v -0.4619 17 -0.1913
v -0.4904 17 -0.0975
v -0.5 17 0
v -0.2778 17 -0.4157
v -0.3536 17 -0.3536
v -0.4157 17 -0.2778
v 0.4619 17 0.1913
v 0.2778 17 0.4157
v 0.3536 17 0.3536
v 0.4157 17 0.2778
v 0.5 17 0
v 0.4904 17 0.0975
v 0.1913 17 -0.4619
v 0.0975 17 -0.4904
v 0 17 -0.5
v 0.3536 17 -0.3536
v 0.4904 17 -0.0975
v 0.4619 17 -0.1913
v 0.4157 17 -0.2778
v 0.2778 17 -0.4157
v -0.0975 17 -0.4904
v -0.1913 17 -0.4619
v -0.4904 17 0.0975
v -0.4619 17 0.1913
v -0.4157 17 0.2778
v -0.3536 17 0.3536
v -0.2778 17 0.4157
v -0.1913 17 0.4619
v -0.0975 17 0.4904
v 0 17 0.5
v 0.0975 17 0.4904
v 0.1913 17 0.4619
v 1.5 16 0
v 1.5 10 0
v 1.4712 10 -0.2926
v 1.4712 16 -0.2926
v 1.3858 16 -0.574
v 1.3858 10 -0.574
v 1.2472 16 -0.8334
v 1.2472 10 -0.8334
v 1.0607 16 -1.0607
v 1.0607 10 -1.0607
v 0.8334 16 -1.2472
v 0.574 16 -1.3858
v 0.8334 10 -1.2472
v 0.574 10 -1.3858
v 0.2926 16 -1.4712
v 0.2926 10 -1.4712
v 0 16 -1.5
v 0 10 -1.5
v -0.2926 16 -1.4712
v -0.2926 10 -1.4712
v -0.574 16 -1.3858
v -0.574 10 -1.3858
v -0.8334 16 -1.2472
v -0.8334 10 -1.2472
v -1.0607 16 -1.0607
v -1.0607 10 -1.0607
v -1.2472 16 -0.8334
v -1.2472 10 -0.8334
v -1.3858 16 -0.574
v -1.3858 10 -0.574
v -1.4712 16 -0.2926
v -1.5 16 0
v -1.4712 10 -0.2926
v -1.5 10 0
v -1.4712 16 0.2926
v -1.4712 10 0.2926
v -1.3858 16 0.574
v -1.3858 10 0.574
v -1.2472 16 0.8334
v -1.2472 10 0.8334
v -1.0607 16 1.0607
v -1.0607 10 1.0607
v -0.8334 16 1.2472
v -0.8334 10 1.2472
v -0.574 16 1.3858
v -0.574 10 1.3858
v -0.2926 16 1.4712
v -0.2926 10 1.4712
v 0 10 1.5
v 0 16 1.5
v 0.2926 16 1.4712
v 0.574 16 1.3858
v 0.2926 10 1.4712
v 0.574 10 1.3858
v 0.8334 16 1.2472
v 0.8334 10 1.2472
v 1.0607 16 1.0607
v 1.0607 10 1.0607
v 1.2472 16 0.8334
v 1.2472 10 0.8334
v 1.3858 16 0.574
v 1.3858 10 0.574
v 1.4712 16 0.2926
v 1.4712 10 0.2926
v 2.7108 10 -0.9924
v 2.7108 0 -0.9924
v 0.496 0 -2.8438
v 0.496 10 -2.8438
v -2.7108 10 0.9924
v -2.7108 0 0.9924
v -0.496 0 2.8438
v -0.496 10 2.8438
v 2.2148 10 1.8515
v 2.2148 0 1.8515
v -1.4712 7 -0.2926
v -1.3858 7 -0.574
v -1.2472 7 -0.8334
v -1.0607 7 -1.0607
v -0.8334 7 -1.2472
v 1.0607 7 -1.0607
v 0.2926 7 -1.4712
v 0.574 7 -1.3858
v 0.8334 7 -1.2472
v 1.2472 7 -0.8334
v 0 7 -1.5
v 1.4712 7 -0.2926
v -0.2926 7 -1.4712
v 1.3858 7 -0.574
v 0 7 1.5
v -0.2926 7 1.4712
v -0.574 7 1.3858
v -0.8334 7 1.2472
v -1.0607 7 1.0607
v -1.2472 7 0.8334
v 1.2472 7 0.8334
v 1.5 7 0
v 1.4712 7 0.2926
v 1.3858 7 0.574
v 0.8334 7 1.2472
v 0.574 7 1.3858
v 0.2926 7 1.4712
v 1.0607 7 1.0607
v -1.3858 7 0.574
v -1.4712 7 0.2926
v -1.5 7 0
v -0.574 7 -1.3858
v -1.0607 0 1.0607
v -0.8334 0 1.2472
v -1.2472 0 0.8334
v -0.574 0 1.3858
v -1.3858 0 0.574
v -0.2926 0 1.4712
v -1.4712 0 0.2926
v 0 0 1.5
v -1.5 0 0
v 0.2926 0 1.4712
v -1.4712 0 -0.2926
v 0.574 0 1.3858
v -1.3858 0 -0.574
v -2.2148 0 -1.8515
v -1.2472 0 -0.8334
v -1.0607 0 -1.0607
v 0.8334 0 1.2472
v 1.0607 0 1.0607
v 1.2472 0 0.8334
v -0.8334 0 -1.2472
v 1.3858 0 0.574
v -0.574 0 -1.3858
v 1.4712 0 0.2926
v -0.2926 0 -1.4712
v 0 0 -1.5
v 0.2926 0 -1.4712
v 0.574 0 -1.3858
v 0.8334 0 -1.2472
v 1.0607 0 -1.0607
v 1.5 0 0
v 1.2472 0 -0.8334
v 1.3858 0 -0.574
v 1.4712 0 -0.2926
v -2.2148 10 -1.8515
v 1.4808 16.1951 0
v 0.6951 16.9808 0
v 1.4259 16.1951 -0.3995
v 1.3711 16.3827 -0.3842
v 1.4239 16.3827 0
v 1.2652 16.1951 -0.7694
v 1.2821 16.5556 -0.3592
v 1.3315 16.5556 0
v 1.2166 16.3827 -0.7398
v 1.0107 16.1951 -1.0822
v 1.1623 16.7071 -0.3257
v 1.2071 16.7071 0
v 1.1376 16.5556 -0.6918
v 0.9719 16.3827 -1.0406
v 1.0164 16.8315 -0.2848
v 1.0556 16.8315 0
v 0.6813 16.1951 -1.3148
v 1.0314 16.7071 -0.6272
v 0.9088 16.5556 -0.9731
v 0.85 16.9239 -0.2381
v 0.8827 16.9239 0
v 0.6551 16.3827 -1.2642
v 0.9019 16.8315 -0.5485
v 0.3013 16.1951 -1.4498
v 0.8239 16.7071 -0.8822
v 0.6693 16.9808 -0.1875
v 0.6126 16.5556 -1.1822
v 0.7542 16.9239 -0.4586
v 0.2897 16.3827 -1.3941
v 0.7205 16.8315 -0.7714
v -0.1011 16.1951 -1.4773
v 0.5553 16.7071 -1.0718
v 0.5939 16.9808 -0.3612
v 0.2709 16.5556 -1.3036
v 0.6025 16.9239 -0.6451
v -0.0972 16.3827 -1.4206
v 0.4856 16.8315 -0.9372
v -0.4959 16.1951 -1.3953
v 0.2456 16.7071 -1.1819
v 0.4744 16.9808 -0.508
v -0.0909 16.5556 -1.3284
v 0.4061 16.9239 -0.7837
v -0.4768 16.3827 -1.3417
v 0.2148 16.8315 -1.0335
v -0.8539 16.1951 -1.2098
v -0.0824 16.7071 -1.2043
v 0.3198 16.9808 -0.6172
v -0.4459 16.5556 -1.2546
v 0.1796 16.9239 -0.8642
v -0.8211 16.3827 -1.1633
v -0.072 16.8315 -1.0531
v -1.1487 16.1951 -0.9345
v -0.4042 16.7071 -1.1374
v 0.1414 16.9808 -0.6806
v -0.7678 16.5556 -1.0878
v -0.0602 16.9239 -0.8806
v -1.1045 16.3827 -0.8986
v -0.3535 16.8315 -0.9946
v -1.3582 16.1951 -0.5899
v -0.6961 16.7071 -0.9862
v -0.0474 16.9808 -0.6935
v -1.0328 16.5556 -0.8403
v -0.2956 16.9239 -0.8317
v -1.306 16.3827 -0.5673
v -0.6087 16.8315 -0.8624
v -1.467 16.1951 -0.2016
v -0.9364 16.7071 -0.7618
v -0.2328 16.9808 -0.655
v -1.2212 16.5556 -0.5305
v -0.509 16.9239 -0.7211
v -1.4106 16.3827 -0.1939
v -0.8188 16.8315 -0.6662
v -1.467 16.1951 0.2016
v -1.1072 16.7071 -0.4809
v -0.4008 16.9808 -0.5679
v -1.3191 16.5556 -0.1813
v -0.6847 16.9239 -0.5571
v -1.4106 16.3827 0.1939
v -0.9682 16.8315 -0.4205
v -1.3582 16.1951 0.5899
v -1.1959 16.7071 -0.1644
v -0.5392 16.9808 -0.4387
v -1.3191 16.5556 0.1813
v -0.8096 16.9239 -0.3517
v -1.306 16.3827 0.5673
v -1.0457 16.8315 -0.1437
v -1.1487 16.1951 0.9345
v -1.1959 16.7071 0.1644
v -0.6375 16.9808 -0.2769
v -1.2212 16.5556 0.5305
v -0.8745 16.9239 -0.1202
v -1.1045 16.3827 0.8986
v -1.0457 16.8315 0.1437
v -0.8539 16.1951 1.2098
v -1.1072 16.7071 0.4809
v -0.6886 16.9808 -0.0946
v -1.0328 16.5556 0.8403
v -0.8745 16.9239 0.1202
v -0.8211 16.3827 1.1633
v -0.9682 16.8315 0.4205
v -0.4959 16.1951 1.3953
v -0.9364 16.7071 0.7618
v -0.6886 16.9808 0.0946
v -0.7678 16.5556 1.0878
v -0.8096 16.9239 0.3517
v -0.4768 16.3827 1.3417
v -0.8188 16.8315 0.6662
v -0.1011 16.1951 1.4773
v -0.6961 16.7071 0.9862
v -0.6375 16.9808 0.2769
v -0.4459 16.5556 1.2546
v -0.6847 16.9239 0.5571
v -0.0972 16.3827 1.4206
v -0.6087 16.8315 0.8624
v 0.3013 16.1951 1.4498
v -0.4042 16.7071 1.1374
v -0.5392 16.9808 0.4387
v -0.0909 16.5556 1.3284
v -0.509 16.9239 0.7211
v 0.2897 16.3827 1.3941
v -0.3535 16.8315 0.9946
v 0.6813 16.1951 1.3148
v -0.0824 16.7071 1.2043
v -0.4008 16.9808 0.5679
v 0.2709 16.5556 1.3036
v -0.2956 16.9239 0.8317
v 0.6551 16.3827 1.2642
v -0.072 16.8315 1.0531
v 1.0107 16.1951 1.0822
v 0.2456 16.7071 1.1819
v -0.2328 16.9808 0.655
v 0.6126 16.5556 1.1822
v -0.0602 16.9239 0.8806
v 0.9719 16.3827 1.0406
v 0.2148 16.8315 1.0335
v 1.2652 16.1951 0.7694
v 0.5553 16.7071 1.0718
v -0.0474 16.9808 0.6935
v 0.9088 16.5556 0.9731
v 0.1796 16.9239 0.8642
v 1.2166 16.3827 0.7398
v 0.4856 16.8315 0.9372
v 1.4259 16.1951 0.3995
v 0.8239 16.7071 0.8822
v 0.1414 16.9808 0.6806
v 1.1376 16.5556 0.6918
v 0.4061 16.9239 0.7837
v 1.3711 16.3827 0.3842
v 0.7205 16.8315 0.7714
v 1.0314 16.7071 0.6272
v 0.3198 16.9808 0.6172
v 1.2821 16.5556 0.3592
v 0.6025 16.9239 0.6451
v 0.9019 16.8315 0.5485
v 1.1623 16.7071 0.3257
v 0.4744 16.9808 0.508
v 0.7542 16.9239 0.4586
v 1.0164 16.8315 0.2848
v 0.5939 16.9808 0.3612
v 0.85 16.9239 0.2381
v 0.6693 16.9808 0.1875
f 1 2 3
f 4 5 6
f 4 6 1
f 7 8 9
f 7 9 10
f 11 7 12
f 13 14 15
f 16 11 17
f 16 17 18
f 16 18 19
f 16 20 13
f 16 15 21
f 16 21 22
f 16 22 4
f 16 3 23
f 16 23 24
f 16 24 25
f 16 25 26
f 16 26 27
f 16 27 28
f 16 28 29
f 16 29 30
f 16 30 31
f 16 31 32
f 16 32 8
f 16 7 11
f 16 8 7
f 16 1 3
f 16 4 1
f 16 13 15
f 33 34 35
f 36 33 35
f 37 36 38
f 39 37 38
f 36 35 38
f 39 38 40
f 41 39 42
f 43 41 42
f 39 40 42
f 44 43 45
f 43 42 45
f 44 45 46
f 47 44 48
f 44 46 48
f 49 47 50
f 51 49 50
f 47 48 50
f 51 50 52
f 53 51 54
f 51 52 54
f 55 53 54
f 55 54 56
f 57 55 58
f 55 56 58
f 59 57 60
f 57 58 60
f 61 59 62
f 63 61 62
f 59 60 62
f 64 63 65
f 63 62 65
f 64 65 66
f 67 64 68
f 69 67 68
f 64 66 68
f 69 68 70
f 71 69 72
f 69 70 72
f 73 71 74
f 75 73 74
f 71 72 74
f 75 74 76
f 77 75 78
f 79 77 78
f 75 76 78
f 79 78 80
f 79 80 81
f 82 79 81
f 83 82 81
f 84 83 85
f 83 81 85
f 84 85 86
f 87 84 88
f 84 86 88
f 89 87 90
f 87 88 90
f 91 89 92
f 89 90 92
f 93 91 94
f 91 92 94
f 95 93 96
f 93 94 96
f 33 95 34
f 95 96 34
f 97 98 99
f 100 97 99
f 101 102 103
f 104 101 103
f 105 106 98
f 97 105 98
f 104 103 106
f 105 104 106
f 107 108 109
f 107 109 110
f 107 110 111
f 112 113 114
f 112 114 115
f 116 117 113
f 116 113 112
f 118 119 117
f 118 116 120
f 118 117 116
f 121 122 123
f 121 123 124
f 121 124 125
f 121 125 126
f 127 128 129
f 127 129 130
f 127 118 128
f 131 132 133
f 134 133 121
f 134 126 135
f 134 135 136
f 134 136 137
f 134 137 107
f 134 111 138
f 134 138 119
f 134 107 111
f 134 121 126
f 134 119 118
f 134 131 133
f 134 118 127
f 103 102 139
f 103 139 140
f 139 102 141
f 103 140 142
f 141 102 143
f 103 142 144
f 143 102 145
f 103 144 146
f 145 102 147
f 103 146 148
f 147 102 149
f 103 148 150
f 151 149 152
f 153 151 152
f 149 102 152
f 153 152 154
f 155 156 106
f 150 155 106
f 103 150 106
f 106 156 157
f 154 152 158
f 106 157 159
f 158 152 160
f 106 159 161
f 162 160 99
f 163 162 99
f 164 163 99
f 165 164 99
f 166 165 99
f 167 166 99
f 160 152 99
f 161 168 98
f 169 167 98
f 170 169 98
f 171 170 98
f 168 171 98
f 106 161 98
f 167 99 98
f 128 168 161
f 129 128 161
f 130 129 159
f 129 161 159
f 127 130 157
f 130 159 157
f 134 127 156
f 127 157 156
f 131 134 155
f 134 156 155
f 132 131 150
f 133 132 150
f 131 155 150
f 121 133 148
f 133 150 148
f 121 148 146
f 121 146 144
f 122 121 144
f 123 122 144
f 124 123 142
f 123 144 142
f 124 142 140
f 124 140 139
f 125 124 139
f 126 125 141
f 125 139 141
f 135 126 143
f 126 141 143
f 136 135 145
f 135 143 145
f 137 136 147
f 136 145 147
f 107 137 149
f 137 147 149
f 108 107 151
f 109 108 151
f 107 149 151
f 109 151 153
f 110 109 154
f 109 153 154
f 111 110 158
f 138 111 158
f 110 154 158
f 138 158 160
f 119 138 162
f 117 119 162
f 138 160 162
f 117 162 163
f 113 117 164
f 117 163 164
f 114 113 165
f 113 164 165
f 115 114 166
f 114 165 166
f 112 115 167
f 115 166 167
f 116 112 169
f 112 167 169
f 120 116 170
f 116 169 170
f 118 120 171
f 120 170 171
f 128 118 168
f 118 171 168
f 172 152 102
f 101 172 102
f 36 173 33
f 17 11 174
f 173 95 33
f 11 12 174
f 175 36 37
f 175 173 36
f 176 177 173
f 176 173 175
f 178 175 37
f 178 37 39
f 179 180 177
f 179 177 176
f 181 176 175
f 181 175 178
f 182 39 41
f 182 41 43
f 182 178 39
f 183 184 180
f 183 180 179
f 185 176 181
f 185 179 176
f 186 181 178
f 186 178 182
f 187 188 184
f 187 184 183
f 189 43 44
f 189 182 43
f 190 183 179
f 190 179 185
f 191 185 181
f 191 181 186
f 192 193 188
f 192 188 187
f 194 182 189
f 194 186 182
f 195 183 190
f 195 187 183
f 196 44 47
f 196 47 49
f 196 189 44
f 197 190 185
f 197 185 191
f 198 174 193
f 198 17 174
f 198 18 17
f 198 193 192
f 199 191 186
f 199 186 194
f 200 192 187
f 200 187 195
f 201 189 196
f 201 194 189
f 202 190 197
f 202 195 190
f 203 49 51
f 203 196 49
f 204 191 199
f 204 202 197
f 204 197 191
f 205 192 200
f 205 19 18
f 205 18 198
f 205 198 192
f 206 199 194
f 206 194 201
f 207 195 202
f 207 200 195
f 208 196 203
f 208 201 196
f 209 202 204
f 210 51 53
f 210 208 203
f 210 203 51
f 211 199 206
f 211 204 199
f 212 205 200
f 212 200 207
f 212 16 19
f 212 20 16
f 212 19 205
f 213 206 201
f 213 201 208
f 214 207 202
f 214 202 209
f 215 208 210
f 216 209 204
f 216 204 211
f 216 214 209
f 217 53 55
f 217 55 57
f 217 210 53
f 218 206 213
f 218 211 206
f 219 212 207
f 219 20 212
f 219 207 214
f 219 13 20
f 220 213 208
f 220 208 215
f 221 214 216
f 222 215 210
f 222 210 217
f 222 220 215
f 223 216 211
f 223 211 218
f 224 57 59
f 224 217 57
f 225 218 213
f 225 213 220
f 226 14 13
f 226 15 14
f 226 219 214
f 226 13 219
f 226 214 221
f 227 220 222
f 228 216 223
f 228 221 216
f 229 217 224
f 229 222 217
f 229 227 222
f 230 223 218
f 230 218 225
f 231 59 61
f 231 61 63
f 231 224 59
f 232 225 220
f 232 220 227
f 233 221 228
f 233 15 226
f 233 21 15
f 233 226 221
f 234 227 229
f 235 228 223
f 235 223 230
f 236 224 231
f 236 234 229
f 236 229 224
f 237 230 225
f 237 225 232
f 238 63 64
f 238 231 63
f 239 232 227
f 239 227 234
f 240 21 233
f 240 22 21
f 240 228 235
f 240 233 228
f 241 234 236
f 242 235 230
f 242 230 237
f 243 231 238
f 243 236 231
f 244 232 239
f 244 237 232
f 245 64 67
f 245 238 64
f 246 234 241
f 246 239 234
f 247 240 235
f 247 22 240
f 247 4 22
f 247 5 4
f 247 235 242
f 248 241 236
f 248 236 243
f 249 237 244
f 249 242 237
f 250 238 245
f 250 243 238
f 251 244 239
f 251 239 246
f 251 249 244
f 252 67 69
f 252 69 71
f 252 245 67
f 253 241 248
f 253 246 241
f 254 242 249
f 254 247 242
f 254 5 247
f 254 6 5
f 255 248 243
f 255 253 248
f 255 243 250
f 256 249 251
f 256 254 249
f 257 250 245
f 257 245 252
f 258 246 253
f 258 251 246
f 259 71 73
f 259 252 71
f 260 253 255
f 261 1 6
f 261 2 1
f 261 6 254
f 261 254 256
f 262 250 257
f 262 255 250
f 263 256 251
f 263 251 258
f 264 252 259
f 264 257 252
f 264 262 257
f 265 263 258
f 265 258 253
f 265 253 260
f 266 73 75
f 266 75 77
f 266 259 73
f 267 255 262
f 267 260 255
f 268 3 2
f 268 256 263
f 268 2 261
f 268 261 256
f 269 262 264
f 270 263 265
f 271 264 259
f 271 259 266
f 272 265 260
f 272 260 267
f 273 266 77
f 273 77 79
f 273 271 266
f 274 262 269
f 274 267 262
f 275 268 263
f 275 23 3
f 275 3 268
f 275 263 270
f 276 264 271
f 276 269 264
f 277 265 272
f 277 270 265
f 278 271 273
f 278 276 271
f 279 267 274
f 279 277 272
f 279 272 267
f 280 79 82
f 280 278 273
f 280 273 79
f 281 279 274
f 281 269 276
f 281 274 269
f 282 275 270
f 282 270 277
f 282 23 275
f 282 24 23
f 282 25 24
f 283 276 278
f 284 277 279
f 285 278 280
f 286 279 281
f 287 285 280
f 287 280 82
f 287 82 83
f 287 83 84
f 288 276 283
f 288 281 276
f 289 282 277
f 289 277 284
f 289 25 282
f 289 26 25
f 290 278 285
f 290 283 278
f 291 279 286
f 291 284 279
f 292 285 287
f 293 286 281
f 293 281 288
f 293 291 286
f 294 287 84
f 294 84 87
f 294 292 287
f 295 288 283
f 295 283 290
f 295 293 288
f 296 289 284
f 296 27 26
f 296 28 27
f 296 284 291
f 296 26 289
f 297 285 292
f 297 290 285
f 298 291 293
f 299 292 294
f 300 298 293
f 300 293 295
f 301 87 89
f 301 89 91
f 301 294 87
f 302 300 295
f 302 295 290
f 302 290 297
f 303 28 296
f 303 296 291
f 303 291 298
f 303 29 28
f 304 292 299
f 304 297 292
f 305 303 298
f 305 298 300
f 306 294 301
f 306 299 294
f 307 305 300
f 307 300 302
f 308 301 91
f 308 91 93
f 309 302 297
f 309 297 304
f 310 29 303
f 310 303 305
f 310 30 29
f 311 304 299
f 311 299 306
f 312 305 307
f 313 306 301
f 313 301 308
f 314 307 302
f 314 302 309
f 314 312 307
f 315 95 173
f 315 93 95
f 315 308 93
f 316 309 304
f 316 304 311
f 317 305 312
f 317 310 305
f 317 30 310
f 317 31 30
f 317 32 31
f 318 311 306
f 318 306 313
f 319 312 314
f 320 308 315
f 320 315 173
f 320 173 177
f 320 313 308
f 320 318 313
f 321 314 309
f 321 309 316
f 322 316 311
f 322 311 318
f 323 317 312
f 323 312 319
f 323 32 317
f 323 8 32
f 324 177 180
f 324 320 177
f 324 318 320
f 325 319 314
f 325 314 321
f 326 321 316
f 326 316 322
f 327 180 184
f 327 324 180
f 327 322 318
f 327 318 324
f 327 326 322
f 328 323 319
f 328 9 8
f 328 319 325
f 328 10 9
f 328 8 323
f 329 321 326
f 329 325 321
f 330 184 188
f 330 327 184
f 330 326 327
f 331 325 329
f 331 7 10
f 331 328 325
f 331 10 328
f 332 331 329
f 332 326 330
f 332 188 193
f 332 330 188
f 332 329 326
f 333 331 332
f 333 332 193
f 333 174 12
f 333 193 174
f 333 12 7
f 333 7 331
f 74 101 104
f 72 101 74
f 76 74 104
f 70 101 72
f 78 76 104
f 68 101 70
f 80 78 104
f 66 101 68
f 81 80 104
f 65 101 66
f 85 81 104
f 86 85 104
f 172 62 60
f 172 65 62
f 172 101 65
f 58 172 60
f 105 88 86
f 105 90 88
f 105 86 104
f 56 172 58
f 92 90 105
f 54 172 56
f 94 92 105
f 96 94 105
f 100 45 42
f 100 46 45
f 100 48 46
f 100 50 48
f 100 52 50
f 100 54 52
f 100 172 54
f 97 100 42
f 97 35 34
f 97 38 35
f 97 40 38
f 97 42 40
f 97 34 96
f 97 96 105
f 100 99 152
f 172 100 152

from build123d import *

# Parameters (mm, degrees)
BOSS_EXTRUDE1_DEPTH = 10
SKETCH2_R           = 1.5
BOSS_EXTRUDE2_DEPTH = 7
SKETCH3_R           = 1.5
CUT_EXTRUDE1_DEPTH  = 7
FILLET1_R           = 1


with BuildPart() as part:
    # Sketch1 → Boss-Extrude1 (new body)
    with BuildSketch(Plane(origin=(0, 0, 0), x_dir=(1, 0, 0), z_dir=(0, 1, 0))):
        Polygon((2.214824591, -1.851454932), (2.7108193, 0.992366895), (0.495994709, 2.843821827), (-2.214824591, 1.851454932), (-2.7108193, -0.992366895), (-0.495994709, -2.843821827), align=None)
    extrude(amount=BOSS_EXTRUDE1_DEPTH)

    # Sketch2 → Boss-Extrude2 (add)
    with BuildSketch(Plane(origin=(0, 10, 0), x_dir=(1, 0, 0), z_dir=(0, 1, 0))):
        Circle(SKETCH2_R)
    extrude(amount=BOSS_EXTRUDE2_DEPTH)

    # Sketch3 → Cut-Extrude1 (cut)
    with BuildSketch(Plane.XZ):
        Circle(SKETCH3_R)
    extrude(amount=-CUT_EXTRUDE1_DEPTH, mode=Mode.SUBTRACT)

    # Fillet1
    fillet1_edges = [part.edges().sort_by_distance(p)[0] for p in [
        (-1.5, 17, 0),
    ]]
    fillet(fillet1_edges, radius=FILLET1_R)


solid = part.part
